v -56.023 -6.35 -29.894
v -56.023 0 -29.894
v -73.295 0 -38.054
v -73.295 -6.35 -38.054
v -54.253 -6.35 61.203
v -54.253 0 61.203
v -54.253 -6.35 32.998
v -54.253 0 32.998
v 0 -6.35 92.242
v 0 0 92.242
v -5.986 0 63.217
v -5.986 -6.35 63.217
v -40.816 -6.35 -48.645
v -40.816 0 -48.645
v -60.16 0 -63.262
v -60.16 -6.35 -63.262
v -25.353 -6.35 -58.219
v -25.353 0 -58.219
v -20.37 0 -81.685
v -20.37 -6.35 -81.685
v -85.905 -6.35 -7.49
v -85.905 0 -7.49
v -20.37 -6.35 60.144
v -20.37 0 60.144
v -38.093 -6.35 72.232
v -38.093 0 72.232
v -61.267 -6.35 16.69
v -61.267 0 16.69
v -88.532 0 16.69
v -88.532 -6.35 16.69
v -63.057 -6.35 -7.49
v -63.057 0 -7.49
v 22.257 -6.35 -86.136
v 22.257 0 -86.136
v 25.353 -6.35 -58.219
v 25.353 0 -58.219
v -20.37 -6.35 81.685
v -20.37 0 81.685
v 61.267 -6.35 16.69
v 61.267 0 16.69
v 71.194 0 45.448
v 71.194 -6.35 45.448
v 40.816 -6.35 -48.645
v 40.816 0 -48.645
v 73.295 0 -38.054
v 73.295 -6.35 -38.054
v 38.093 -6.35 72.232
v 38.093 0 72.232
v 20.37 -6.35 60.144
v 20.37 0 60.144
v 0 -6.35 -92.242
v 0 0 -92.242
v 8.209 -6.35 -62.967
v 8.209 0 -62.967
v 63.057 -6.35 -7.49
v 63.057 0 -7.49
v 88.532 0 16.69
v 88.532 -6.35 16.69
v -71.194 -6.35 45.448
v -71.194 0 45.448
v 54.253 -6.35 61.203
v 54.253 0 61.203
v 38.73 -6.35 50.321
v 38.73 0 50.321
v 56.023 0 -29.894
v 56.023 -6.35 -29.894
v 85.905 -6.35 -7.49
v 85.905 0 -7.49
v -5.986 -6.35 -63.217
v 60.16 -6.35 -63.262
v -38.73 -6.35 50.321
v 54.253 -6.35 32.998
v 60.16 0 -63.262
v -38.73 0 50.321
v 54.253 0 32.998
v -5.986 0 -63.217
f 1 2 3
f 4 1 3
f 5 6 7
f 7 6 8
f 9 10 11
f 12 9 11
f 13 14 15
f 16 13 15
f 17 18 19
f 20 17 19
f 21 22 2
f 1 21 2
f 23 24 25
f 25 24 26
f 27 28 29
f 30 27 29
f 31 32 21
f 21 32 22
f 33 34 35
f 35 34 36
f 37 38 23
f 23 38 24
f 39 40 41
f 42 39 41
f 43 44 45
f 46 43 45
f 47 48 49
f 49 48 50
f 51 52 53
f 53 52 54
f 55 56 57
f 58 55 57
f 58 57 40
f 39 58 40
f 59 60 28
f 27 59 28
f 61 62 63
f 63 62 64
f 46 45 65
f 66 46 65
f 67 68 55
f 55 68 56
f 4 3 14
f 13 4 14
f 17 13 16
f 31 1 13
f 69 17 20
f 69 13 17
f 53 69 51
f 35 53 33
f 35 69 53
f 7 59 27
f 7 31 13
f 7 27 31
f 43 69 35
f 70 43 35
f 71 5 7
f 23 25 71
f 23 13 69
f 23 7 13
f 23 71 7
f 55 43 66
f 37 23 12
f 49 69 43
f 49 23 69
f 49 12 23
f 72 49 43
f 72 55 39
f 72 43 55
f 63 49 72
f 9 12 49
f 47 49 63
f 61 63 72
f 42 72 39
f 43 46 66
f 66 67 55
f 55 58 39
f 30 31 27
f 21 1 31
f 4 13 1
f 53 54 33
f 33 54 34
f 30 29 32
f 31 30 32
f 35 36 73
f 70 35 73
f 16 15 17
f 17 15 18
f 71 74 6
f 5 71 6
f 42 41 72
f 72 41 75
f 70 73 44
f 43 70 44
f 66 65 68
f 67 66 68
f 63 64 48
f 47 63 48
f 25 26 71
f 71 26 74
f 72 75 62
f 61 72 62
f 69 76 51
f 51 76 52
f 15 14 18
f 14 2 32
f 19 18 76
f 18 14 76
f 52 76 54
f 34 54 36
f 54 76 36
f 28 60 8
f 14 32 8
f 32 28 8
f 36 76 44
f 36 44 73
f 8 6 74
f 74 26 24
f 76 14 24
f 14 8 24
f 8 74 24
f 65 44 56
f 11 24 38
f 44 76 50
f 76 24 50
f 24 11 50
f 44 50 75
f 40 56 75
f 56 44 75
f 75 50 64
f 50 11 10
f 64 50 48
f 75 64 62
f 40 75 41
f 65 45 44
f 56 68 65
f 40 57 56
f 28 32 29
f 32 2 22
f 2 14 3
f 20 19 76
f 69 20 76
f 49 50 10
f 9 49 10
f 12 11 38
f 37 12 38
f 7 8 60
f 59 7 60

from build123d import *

# Parameters (mm, degrees)
F1_DEPTH = 6.35
F2_DEPTH = 6.35
F3_DEPTH = 6.35
F4_DEPTH = 6.35
F5_DEPTH = 6.35


# Not quite as in the source:
# - a feature names something its author has since deleted; it is built from what else it names


with BuildPart() as f1:
    # F0 (on Front) → F1 (new body)
    with BuildSketch(Plane.XZ):
        with BuildLine():
            ThreePointArc((63.0566746496, -7.490379305), (63.3890717721, -3.751743578), (63.5, 0))
            ThreePointArc((63.5, 0), (62.9393473013, 8.4195345051), (61.2672894084, 16.6903939003))
            ThreePointArc((61.2672894084, 16.6903939003), (58.3327446269, 25.0906537239), (54.2527974979, 32.9982418266))
            ThreePointArc((54.2527974979, 32.9982418266), (47.291532101, 42.3764202304), (38.730412603, 50.3210208521))
            ThreePointArc((38.730412603, 50.3210208521), (29.9555685969, 55.9903019284), (20.3699341201, 60.1441250991))
            ThreePointArc((20.3699341201, 60.1441250991), (7.3544916147, 63.0726680353), (-5.9855682874, 63.2172679912))
            ThreePointArc((-5.9855682874, 63.2172679912), (-13.2670335267, 62.09859758), (-20.3699341201, 60.1441250991))
            ThreePointArc((-20.3699341201, 60.1441250991), (-29.9555685969, 55.9903019284), (-38.730412603, 50.3210208521))
            ThreePointArc((-38.730412603, 50.3210208521), (-47.291532101, 42.3764202304), (-54.2527974979, 32.9982418266))
            ThreePointArc((-54.2527974979, 32.9982418266), (-58.3327446269, 25.0906537239), (-61.2672894084, 16.6903939003))
            ThreePointArc((-61.2672894084, 16.6903939003), (-63.3268462658, 4.6862076377), (-63.0566746496, -7.490379305))
            ThreePointArc((-63.0566746496, -7.490379305), (-60.5844983842, -19.0202143924), (-56.023116606, -29.8941533708))
            ThreePointArc((-56.023116606, -29.8941533708), (-49.318773707, -39.9988569841), (-40.8158107072, -48.6448311366))
            ThreePointArc((-40.8158107072, -48.6448311366), (-33.4288158961, -53.9885568226), (-25.3527004473, -58.2193316694))
            ThreePointArc((-25.3527004473, -58.2193316694), (-15.8671551858, -61.4856356095), (-5.9855682874, -63.2172679912))
            ThreePointArc((-5.9855682874, -63.2172679912), (1.1186954333, -63.4901450662), (8.2089360928, -62.9671610304))
            ThreePointArc((8.2089360928, -62.9671610304), (16.9479005402, -61.1965576424), (25.3527004473, -58.2193316694))
            ThreePointArc((25.3527004473, -58.2193316694), (33.4288158961, -53.9885568226), (40.8158107072, -48.6448311366))
            ThreePointArc((40.8158107072, -48.6448311366), (49.318773707, -39.9988569841), (56.023116606, -29.8941533708))
            ThreePointArc((56.023116606, -29.8941533708), (60.5844983842, -19.0202143924), (63.0566746496, -7.490379305))
        make_face()
        with BuildLine():
            ThreePointArc((61.2672894084, 16.6903939003), (62.9393473013, 8.4195345051), (63.5, 0))
            ThreePointArc((63.5, 0), (63.3890717721, -3.751743578), (63.0566746496, -7.490379305))
            Line((63.0566746496, -7.490379305), (88.5324627161, 16.6903939003))
            Line((88.5324627161, 16.6903939003), (61.2672894084, 16.6903939003))
        make_face()
        with BuildLine():
            ThreePointArc((54.2527974979, 32.9982418266), (58.3327446269, 25.0906537239), (61.2672894084, 16.6903939003))
            Line((61.2672894084, 16.6903939003), (71.193754673, 45.4481393099))
            Line((71.193754673, 45.4481393099), (54.2527974979, 32.9982418266))
        make_face()
        with BuildLine():
            Line((85.9054028988, -7.490379305), (63.0566746496, -7.490379305))
            ThreePointArc((63.0566746496, -7.490379305), (60.5844983842, -19.0202143924), (56.023116606, -29.8941533708))
            Line((56.023116606, -29.8941533708), (85.9054028988, -7.490379305))
        make_face()
        with BuildLine():
            ThreePointArc((38.730412603, 50.3210208521), (47.291532101, 42.3764202304), (54.2527974979, 32.9982418266))
            Line((54.2527974979, 32.9982418266), (54.2527974979, 61.2032547377))
            Line((54.2527974979, 61.2032547377), (38.730412603, 50.3210208521))
        make_face()
        with BuildLine():
            ThreePointArc((20.3699341201, 60.1441250991), (29.9555685969, 55.9903019284), (38.730412603, 50.3210208521))
            Line((38.730412603, 50.3210208521), (38.0926132202, 72.2317844629))
            Line((38.0926132202, 72.2317844629), (20.3699341201, 60.1441250991))
        make_face()
        with BuildLine():
            Line((60.1600408554, -63.261911273), (40.8158107072, -48.6448311366))
            ThreePointArc((40.8158107072, -48.6448311366), (33.4288158961, -53.9885568226), (25.3527004473, -58.2193316694))
            Line((25.3527004473, -58.2193316694), (60.1600408554, -63.261911273))
        make_face()
        with BuildLine():
            ThreePointArc((-20.3699341201, 60.1441250991), (-13.2670335267, 62.09859758), (-5.9855682874, 63.2172679912))
            Line((-5.9855682874, 63.2172679912), (-20.3699341201, 81.6848352551))
            Line((-20.3699341201, 81.6848352551), (-20.3699341201, 60.1441250991))
        make_face()
        with BuildLine():
            ThreePointArc((-38.730412603, 50.3210208521), (-29.9555685969, 55.9903019284), (-20.3699341201, 60.1441250991))
            Line((-20.3699341201, 60.1441250991), (-38.0926132202, 72.2317844629))
            Line((-38.0926132202, 72.2317844629), (-38.730412603, 50.3210208521))
        make_face()
        with BuildLine():
            ThreePointArc((-54.2527974979, 32.9982418266), (-47.291532101, 42.3764202304), (-38.730412603, 50.3210208521))
            Line((-38.730412603, 50.3210208521), (-54.2527974979, 61.2032547377))
            Line((-54.2527974979, 61.2032547377), (-54.2527974979, 32.9982418266))
        make_face()
        with BuildLine():
            Line((-60.1600408554, -63.261911273), (-25.3527004473, -58.2193316694))
            ThreePointArc((-25.3527004473, -58.2193316694), (-33.4288158961, -53.9885568226), (-40.8158107072, -48.6448311366))
            Line((-40.8158107072, -48.6448311366), (-60.1600408554, -63.261911273))
        make_face()
        with BuildLine():
            ThreePointArc((-61.2672894084, 16.6903939003), (-58.3327446269, 25.0906537239), (-54.2527974979, 32.9982418266))
            Line((-54.2527974979, 32.9982418266), (-71.193754673, 45.4481393099))
            Line((-71.193754673, 45.4481393099), (-61.2672894084, 16.6903939003))
        make_face()
        with BuildLine():
            ThreePointArc((-63.0566746496, -7.490379305), (-63.3268462658, 4.6862076377), (-61.2672894084, 16.6903939003))
            Line((-61.2672894084, 16.6903939003), (-88.5324627161, 16.6903939003))
            Line((-88.5324627161, 16.6903939003), (-63.0566746496, -7.490379305))
        make_face()
        with BuildLine():
            Line((-85.9054028988, -7.490379305), (-56.023116606, -29.8941533708))
            ThreePointArc((-56.023116606, -29.8941533708), (-60.5844983842, -19.0202143924), (-63.0566746496, -7.490379305))
            Line((-63.0566746496, -7.490379305), (-85.9054028988, -7.490379305))
        make_face()
    extrude(amount=F1_DEPTH)

    # F0 (on Front) → F2 (join)
    with BuildSketch(Plane.XZ):
        with BuildLine():
            Line((-73.2954144478, -38.053765893), (-40.8158107072, -48.6448311366))
            ThreePointArc((-40.8158107072, -48.6448311366), (-49.318773707, -39.9988569841), (-56.023116606, -29.8941533708))
            Line((-56.023116606, -29.8941533708), (-73.2954144478, -38.053765893))
        make_face()
        with BuildLine():
            Line((73.2954144478, -38.053765893), (56.023116606, -29.8941533708))
            ThreePointArc((56.023116606, -29.8941533708), (49.318773707, -39.9988569841), (40.8158107072, -48.6448311366))
            Line((40.8158107072, -48.6448311366), (73.2954144478, -38.053765893))
        make_face()
    extrude(amount=F2_DEPTH)

    # F0 (on Front) → F3 (join)
    with BuildSketch(Plane.XZ):
        with BuildLine():
            Line((0, -92.2421216965), (8.2089360928, -62.9671610304))
            ThreePointArc((8.2089360928, -62.9671610304), (1.1186954333, -63.4901450662), (-5.9855682874, -63.2172679912))
            Line((-5.9855682874, -63.2172679912), (0, -92.2421216965))
        make_face()
        with BuildLine():
            ThreePointArc((-5.9855682874, 63.2172679912), (7.3544916147, 63.0726680353), (20.3699341201, 60.1441250991))
            Line((20.3699341201, 60.1441250991), (0, 92.2421216965))
            Line((0, 92.2421216965), (-5.9855682874, 63.2172679912))
        make_face()
    extrude(amount=F3_DEPTH)

    # F0 (on Front) → F4 (join)
    with BuildSketch(Plane.XZ):
        with BuildLine():
            Line((-20.3699341201, -81.6848352551), (-5.9855682874, -63.2172679912))
            ThreePointArc((-5.9855682874, -63.2172679912), (-15.8671551858, -61.4856356095), (-25.3527004473, -58.2193316694))
            Line((-25.3527004473, -58.2193316694), (-20.3699341201, -81.6848352551))
        make_face()
        with BuildLine():
            Line((60.1600408554, -63.261911273), (40.8158107072, -48.6448311366))
            ThreePointArc((40.8158107072, -48.6448311366), (33.4288158961, -53.9885568226), (25.3527004473, -58.2193316694))
            Line((25.3527004473, -58.2193316694), (60.1600408554, -63.261911273))
        make_face()
    extrude(amount=F4_DEPTH)

    # F0 (on Front) → F5 (join)
    with BuildSketch(Plane.XZ):
        with BuildLine():
            Line((22.25664258, -86.1358046532), (25.3527004473, -58.2193316694))
            ThreePointArc((25.3527004473, -58.2193316694), (16.9479005402, -61.1965576424), (8.2089360928, -62.9671610304))
            Line((8.2089360928, -62.9671610304), (22.25664258, -86.1358046532))
        make_face()
    extrude(amount=F5_DEPTH)


solid = f1.part
